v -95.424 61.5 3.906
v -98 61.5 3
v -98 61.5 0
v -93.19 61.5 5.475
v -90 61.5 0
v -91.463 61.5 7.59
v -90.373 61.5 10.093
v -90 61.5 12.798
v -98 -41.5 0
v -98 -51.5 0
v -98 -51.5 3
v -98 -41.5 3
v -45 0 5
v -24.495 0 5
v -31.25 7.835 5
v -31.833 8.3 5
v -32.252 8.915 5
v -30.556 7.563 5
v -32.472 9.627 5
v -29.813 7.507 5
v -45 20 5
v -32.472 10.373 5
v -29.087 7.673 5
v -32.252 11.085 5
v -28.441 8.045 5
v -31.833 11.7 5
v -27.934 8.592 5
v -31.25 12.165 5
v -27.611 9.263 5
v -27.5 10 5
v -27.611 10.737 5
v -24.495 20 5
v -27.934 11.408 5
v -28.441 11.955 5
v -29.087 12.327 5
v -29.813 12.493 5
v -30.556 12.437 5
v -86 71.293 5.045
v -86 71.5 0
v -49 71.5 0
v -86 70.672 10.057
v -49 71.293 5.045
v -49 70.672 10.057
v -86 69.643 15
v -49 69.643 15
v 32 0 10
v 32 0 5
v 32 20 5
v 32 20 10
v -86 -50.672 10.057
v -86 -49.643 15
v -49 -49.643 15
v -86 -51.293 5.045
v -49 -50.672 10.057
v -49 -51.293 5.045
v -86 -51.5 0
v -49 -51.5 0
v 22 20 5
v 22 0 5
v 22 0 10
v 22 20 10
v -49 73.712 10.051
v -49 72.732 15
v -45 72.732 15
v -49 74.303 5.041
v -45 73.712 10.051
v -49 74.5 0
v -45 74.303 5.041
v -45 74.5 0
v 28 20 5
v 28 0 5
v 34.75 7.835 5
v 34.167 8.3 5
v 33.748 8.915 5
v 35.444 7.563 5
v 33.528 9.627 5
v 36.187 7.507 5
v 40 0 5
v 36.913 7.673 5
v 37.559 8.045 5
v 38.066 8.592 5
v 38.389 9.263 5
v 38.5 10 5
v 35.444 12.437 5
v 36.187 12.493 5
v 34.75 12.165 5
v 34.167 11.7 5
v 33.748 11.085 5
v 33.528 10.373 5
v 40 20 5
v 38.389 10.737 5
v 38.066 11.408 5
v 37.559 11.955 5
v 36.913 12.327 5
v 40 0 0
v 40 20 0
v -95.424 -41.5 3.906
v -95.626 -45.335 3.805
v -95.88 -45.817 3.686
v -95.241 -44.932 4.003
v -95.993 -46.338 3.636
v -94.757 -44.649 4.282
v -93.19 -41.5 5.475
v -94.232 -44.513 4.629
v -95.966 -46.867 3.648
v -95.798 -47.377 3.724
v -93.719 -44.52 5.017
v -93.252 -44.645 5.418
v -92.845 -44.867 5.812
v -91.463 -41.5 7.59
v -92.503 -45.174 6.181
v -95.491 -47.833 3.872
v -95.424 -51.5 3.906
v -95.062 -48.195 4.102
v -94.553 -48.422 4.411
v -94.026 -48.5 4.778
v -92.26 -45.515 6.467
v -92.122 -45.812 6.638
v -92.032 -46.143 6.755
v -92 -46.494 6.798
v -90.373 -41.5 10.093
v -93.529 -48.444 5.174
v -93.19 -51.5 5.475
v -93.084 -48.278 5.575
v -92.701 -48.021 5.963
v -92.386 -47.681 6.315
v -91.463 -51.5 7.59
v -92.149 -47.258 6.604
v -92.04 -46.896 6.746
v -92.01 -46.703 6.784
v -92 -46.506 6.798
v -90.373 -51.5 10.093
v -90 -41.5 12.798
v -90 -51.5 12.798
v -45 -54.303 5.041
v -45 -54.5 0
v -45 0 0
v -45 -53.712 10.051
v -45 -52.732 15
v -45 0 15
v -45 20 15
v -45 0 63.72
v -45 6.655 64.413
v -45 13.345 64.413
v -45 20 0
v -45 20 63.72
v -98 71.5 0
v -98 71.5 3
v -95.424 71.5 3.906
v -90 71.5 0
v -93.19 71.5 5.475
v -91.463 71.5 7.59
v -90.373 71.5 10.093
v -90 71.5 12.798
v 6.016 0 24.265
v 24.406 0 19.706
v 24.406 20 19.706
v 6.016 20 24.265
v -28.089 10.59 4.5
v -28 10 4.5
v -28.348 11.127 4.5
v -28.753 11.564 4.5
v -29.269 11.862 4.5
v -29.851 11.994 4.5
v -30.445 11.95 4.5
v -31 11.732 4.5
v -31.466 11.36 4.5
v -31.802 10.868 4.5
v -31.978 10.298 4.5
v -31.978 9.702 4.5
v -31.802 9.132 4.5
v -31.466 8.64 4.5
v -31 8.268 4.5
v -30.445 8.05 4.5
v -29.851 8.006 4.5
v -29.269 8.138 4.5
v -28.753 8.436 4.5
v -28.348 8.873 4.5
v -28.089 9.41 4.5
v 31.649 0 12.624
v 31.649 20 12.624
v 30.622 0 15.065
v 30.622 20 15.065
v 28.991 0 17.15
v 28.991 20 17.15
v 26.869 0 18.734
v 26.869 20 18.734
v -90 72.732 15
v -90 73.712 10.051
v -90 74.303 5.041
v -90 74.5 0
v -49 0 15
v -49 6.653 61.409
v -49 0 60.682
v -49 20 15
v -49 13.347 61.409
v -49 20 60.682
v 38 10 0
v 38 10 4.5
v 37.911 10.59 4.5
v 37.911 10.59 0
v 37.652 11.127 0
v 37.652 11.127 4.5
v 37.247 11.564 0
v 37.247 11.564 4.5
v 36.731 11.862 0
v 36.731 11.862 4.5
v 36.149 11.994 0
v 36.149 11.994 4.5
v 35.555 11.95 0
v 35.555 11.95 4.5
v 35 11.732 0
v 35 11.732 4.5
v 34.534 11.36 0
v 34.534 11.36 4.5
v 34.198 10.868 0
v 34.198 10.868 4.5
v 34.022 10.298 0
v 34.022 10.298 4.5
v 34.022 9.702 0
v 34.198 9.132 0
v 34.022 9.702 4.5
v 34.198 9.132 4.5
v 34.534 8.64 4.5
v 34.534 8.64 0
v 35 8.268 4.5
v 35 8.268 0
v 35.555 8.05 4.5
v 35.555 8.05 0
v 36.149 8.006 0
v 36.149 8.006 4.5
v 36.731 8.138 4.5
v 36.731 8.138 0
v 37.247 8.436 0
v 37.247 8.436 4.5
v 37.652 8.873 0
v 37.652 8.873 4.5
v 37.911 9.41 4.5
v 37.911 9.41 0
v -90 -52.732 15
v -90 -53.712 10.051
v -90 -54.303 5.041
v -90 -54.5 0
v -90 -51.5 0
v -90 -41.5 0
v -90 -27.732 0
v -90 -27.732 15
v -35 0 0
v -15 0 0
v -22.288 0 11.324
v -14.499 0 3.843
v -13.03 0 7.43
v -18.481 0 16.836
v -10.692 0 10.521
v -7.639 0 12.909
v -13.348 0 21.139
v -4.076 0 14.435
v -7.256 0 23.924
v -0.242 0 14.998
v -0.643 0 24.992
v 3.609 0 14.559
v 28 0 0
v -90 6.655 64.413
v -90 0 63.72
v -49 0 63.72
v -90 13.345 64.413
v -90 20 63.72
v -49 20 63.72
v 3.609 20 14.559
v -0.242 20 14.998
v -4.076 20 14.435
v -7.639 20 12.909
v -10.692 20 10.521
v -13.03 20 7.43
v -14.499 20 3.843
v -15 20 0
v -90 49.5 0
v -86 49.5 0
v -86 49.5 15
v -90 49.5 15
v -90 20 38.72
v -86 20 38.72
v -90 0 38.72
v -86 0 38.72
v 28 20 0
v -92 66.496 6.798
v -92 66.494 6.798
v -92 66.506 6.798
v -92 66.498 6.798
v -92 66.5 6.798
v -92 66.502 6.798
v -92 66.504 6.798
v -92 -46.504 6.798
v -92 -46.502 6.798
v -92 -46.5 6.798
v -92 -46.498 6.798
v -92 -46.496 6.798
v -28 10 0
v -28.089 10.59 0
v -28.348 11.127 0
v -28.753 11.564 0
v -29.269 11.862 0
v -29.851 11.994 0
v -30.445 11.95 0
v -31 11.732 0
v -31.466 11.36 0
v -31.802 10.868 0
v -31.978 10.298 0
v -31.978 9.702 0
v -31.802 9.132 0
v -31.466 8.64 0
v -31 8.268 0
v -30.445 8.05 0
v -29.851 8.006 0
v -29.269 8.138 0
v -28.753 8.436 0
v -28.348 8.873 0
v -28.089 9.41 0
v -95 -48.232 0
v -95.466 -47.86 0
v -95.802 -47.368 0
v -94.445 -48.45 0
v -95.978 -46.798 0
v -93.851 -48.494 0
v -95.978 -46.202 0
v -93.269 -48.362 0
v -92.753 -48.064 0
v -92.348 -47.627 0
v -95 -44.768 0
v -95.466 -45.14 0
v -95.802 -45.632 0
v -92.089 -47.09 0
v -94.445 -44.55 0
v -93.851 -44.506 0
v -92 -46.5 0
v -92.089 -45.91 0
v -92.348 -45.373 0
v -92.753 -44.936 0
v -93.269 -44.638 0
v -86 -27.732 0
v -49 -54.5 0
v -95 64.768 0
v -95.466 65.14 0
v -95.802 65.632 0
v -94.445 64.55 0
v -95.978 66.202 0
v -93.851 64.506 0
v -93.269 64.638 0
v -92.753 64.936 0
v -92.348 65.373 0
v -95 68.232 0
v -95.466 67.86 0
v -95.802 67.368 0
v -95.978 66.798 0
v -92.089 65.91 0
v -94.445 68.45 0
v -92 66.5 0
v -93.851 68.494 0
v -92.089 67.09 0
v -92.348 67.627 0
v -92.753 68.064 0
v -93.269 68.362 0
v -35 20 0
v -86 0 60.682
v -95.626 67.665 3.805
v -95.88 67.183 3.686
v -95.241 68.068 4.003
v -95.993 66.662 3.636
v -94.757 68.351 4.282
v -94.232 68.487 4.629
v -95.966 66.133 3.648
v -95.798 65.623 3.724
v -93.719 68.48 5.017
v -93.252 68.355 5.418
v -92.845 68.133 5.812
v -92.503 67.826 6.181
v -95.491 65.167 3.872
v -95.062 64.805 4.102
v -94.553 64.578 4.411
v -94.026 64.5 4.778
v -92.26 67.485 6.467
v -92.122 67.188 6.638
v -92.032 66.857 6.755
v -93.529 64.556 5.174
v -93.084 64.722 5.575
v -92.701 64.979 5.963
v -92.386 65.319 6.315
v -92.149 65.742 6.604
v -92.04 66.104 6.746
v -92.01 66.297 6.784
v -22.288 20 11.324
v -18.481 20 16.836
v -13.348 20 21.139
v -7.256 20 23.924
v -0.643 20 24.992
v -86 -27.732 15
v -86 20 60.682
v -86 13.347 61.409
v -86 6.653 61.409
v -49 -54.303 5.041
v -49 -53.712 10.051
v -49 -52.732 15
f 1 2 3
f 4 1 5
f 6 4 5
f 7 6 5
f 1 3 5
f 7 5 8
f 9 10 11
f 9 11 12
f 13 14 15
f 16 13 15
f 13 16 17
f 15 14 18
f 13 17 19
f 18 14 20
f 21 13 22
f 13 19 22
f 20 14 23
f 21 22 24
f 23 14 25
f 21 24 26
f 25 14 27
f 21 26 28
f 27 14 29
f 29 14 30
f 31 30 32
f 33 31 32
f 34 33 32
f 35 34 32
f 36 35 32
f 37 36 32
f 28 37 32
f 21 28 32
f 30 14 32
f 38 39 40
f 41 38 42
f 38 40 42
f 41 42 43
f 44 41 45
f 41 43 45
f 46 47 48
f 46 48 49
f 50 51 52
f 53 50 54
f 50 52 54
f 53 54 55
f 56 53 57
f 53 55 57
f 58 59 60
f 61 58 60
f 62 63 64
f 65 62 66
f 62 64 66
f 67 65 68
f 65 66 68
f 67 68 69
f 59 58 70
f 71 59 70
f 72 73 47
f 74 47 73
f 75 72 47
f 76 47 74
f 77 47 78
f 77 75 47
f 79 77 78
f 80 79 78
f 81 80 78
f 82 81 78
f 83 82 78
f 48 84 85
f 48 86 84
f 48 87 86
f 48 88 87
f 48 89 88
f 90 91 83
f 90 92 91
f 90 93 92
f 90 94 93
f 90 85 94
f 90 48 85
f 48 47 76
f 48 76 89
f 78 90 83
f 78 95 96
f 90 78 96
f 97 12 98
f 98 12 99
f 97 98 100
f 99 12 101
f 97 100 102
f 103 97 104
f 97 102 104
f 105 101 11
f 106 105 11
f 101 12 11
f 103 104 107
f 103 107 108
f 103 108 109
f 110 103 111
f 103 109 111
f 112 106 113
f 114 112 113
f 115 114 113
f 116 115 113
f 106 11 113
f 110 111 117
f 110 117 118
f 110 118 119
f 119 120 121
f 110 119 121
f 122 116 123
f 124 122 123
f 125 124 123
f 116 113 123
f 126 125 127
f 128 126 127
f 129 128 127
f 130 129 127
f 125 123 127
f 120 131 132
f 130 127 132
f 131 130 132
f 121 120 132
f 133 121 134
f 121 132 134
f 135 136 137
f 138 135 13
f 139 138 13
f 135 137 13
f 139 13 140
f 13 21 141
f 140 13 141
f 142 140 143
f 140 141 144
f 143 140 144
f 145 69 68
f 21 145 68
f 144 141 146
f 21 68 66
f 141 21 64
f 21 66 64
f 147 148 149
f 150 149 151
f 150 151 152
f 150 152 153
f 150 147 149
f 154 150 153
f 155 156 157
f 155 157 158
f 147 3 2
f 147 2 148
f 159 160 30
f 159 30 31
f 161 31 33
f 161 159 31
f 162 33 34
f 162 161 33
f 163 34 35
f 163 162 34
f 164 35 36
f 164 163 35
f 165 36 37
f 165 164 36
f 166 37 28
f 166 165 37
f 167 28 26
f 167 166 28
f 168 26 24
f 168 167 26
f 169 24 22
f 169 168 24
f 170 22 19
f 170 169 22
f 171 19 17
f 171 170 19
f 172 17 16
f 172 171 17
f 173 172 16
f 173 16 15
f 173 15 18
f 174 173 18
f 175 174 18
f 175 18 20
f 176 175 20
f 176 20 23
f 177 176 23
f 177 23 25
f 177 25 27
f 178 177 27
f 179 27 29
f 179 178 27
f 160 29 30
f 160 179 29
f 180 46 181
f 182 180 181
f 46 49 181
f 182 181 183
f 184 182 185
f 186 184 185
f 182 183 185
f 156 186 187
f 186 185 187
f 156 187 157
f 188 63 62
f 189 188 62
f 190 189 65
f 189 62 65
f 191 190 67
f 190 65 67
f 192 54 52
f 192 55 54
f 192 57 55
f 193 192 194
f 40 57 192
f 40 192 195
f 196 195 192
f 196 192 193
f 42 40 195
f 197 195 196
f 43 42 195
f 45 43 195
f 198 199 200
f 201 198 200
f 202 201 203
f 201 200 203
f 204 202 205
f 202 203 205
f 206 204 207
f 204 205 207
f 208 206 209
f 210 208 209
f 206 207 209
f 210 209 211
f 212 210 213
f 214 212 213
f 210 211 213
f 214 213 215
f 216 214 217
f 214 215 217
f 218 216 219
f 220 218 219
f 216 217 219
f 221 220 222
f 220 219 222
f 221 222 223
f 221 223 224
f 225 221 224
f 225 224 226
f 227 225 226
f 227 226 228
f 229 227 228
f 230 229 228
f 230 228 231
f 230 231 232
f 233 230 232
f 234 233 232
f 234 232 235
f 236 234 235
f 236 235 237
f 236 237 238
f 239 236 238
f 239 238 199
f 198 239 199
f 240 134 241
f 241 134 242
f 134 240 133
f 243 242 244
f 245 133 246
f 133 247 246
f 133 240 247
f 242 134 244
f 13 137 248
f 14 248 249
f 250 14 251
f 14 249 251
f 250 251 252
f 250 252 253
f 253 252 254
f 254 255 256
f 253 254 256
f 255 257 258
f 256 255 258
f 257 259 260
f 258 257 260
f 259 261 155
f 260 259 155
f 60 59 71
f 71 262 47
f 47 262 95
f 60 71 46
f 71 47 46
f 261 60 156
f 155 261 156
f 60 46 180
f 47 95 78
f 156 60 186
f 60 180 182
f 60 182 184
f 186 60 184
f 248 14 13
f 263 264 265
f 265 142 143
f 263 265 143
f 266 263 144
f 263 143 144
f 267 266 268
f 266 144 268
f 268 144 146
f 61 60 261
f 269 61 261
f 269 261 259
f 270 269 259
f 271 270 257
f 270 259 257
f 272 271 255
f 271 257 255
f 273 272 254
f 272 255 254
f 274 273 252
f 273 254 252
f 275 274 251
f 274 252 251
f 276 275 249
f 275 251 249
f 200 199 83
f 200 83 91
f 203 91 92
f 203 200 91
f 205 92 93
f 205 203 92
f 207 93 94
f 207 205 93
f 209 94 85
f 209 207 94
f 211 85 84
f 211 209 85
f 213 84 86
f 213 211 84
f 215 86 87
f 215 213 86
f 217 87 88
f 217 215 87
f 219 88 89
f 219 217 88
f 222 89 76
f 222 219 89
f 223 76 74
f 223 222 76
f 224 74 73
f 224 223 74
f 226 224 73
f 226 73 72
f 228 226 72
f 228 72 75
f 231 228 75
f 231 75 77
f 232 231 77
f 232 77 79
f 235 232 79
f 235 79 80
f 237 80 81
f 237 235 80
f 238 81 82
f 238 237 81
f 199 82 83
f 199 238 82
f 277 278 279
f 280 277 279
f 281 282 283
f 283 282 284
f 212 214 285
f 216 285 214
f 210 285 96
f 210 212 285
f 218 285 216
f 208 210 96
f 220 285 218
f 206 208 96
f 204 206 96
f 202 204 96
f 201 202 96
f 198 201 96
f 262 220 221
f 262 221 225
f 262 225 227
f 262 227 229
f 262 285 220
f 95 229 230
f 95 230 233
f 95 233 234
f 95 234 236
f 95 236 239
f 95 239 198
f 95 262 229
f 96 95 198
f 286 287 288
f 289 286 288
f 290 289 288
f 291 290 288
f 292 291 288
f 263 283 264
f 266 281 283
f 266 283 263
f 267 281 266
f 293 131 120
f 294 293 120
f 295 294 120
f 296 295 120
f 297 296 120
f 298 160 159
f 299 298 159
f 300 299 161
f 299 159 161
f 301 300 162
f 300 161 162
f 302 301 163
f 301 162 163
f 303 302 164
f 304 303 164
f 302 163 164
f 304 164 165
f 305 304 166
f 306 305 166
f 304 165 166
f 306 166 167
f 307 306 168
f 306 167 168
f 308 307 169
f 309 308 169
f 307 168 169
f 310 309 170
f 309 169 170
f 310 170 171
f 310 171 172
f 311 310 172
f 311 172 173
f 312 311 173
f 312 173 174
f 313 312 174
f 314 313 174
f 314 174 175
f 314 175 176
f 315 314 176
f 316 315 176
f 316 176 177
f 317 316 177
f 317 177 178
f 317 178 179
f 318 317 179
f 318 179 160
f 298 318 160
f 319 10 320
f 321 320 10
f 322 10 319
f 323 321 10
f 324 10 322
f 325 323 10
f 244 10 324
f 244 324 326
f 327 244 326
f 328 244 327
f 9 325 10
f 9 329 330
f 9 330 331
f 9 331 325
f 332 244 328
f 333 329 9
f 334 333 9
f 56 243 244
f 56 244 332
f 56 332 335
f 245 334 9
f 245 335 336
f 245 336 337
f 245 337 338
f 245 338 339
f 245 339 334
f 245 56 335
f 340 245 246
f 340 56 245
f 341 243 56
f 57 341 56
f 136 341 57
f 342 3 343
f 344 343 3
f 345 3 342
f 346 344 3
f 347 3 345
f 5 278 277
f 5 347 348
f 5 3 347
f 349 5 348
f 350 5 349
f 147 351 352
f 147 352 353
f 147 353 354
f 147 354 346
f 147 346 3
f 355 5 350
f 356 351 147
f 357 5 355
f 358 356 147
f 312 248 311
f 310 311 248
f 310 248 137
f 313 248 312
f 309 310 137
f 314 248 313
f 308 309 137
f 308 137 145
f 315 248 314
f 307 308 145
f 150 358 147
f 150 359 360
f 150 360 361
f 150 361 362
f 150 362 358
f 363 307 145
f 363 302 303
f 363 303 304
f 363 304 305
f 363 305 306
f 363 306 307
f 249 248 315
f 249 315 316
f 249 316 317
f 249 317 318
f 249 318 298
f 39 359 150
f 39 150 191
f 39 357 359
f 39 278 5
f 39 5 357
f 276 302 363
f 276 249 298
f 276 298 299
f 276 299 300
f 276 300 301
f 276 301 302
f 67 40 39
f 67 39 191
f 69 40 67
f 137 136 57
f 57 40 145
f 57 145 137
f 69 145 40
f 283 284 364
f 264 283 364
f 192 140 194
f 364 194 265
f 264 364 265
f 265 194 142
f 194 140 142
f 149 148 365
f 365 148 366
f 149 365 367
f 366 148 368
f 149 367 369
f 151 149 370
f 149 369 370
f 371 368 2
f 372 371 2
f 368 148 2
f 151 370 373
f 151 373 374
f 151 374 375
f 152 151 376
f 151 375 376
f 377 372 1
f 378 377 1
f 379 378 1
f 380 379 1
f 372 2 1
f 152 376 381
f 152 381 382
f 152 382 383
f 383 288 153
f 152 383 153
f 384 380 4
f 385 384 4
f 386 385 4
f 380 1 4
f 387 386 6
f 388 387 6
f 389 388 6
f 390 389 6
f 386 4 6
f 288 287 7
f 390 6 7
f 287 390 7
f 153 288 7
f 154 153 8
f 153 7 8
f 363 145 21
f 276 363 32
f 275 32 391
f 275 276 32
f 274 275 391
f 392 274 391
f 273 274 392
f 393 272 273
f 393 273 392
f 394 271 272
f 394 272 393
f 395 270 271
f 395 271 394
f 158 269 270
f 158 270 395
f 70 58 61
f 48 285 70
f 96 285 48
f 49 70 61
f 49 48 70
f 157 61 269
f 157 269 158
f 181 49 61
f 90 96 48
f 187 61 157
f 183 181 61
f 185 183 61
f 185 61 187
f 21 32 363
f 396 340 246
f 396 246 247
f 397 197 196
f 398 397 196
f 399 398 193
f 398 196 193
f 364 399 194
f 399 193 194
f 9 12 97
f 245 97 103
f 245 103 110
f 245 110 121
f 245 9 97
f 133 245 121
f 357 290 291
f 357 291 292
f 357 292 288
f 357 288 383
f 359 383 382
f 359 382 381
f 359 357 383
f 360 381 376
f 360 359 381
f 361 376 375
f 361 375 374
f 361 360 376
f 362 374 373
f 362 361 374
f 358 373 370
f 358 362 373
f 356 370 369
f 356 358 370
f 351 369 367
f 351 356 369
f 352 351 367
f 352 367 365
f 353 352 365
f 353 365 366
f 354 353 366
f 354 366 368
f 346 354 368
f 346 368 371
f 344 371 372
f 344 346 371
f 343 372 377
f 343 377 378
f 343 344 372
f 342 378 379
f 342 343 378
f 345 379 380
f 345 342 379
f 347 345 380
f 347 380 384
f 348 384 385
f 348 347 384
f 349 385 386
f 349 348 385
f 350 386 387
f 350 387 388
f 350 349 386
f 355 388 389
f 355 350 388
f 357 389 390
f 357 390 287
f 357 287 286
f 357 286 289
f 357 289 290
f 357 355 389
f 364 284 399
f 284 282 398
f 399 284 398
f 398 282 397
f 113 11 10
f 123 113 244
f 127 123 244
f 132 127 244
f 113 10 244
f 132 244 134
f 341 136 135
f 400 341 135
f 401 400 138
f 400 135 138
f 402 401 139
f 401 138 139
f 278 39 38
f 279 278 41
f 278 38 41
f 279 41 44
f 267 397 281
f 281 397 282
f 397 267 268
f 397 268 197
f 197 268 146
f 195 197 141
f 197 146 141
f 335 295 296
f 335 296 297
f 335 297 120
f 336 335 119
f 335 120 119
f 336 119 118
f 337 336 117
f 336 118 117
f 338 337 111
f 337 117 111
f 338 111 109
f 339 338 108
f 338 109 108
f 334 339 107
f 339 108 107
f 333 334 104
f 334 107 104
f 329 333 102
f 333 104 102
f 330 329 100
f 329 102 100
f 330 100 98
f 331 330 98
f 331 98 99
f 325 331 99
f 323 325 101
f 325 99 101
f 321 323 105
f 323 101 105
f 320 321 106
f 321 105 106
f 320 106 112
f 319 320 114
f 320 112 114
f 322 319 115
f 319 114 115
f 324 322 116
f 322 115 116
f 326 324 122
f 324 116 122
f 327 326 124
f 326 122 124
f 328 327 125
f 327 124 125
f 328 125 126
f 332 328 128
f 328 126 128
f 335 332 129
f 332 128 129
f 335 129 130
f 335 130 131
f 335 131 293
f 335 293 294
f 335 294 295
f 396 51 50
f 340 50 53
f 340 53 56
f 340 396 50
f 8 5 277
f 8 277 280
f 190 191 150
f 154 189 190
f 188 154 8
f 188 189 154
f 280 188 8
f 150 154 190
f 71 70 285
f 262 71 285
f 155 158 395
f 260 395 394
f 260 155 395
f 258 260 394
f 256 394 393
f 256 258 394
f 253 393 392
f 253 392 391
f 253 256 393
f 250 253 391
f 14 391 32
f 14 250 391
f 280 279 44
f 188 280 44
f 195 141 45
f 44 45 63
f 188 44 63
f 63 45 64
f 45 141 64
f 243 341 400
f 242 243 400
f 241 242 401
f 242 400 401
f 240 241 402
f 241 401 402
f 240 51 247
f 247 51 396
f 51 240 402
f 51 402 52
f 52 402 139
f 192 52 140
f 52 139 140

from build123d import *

# Parameters (mm, degrees)
EXTRUDE_1_DEPTH          = 20
SKETCH_2_W               = 6
SKETCH_2_H               = 10
CUT_EXTRUDE_1_DEPTH      = 20
EXTRUDE_2_DEPTH          = 5
EXTRUDE_2_DEPTH_BACK     = 5
SKETCH_3_W               = 8
SKETCH_3_H               = 20
EXTRUDE_3_DEPTH          = 5
EXTRUDE_3_DEPTH_BACK     = 5
SKETCH_4_W               = 20
SKETCH_4_H               = 20
CUT_EXTRUDE_2_DEPTH      = 52.23475383
CUT_EXTRUDE_2_DEPTH_BACK = 52.23475383
SKETCH_5_W               = 80.386179801
SKETCH_5_H               = 26.605581219
SKETCH_6_R               = 2
CUT_EXTRUDE_3_DEPTH      = 49.989794856
CHAMFER_1_SIZE           = 0.5
FILLET_1_R               = 10
SKETCH_7_W               = 5
SKETCH_7_H               = 20
EXTRUDE_4_DEPTH          = 10
SKETCH_8_R               = 64.5
EXTRUDE_5_DEPTH          = 4
SKETCH_9_W               = 60
SKETCH_9_H               = 60
SKETCH_9_W_2             = 85.907763787
SKETCH_9_H_2             = 140
CUT_EXTRUDE_4_DEPTH      = 5
EXTRUDE_8_DEPTH          = 37
EXTRUDE_9_DEPTH          = 4
SKETCH_15_W              = 8
SKETCH_15_H              = 10
EXTRUDE_10_DEPTH         = 3
SKETCH_16_R              = 2
CUT_EXTRUDE_5_DEPTH      = 3
FILLET_START             = -51.5
FILLET_2_DEPTH           = 2.999999733
FILLET_START_2           = 61.5
FILLET_2_2_DEPTH         = 2.999999733
FILLET_START_3           = -44.499993891
FILLET_2_3_DEPTH         = 2.999993891
FILLET_START_4           = 68.500006109
FILLET_2_4_DEPTH         = 2.999993891
FILLET_START_5           = -48.500000267
FILLET_2_5_DEPTH         = 4.000006376
FILLET_START_6           = 64.499999733
FILLET_2_6_DEPTH         = 4.000006376
FILLET_START_7           = 3
FILLET_2_7_OUTLINE_R     = 2
FILLET_2_7_DEPTH         = 3.797947653


with BuildPart() as part:
    # 草图1 → 凸台-拉伸1 (new body)
    with BuildSketch(Plane(origin=(0, 0, 0), x_dir=(1, 0, 0), z_dir=(0, 1, 0))):
        with BuildLine():
            Line((32, 17.82359333), (32, -17.82359333))
            Line((32, -17.82359333), (6.015712619, -24.265432238))
            ThreePointArc((6.015712619, -24.265432238), (-25, 0), (6.015712619, 24.265432238))
            Line((6.015712619, 24.265432238), (32, 17.82359333))
        make_face()
        with BuildLine():
            Line((22, 10), (22, -10))
            Line((22, -10), (3.609427572, -14.559259343))
            ThreePointArc((3.609427572, -14.559259343), (-15, 0), (3.609427572, 14.559259343))
            Line((3.609427572, 14.559259343), (22, 10))
        make_face(mode=Mode.SUBTRACT)
    extrude(amount=EXTRUDE_1_DEPTH)

    # 草图2 → 切除-拉伸1 (cut)
    with BuildSketch(Plane(origin=(0, 20, 0), x_dir=(1, 0, 0), z_dir=(0, 1, 0))):
        with Locations((25, 0)):
            Rectangle(SKETCH_2_W, SKETCH_2_H)
    extrude(amount=-CUT_EXTRUDE_1_DEPTH, mode=Mode.SUBTRACT)

    # 草图3 → 凸台-拉伸2 (add, two sides: drawn at the far end of the back side and taken through both)
    with BuildSketch(Plane.XY.offset(-EXTRUDE_2_DEPTH_BACK)):
        with Locations((36, 10)):
            Rectangle(SKETCH_3_W, SKETCH_3_H)
    extrude(amount=EXTRUDE_2_DEPTH + EXTRUDE_2_DEPTH_BACK)

    # 草图4 → 凸台-拉伸3 (add, two sides: drawn at the far end of the back side and taken through both)
    with BuildSketch(Plane.XY.offset(-EXTRUDE_3_DEPTH_BACK)):
        with Locations((-25, 10)):
            Rectangle(SKETCH_4_W, SKETCH_4_H)
    extrude(amount=EXTRUDE_3_DEPTH + EXTRUDE_3_DEPTH_BACK)

    # 草图5 → 切除-拉伸2 (cut, two sides: drawn at the far end of the back side and taken through both)
    with BuildSketch(Plane(origin=(0, 20, 0), x_dir=(1, 0, 0), z_dir=(0, 1, 0)).offset(-CUT_EXTRUDE_2_DEPTH_BACK)):
        with Locations((-0.193089901, 13.30279061)):
            Rectangle(SKETCH_5_W, SKETCH_5_H)
    extrude(amount=CUT_EXTRUDE_2_DEPTH + CUT_EXTRUDE_2_DEPTH_BACK, mode=Mode.SUBTRACT)

    # 草图6 → 切除-拉伸3 (cut, through all)
    with BuildSketch(Plane.XY.offset(5)):
        with Locations((-30, 10)):
            Circle(SKETCH_6_R)
        with Locations((36, 10)):
            Circle(SKETCH_6_R)
    extrude(amount=-CUT_EXTRUDE_3_DEPTH, mode=Mode.SUBTRACT)

    # 倒角1
    chamfer_1_edges = [part.edges().sort_by_distance(p)[0] for p in [
        (-32, 10, 5),
        (34, 10, 5),
    ]]
    chamfer(chamfer_1_edges, length=CHAMFER_1_SIZE)

    # 圆角1
    fillet_1_edges = [part.edges().sort_by_distance(p)[0] for p in [
        (32, 10, 17.82359333),
    ]]
    fillet(fillet_1_edges, radius=FILLET_1_R)

    # 草图7 → 凸台-拉伸4 (add)
    with BuildSketch(Plane.ZY.offset(35)):
        with Locations((2.5, 10)):
            Rectangle(SKETCH_7_W, SKETCH_7_H)
    extrude(amount=EXTRUDE_4_DEPTH)

    # 草图8 → 凸台-拉伸5 (add)
    with BuildSketch(Plane.ZY.offset(45)):
        with Locations((0, 10)):
            Circle(SKETCH_8_R)
    extrude(amount=EXTRUDE_5_DEPTH)

    # 草图9 → 切除-拉伸4 (cut)
    with BuildSketch(Plane(origin=(-45, 0, 0), x_dir=(0, 0, -1), z_dir=(1, 0, 0))):
        with Locations((-45, 50)):
            Rectangle(SKETCH_9_W, SKETCH_9_H)
        with Locations((-45, -30)):
            Rectangle(SKETCH_9_W, SKETCH_9_H)
        with Locations((42.953881894, 10)):
            Rectangle(SKETCH_9_W_2, SKETCH_9_H_2)
    extrude(amount=-CUT_EXTRUDE_4_DEPTH, mode=Mode.SUBTRACT)

    # 草图11 → 凸台-拉伸8 (add)
    with BuildSketch(Plane.ZY.offset(49)):
        with BuildLine():
            ThreePointArc((60.681545794, 20), (61.5, 10), (60.681545794, 0))
            Line((60.681545794, 0), (63.720091023, 0))
            ThreePointArc((63.720091023, 0), (64.5, 10), (63.720091023, 20))
            Line((63.720091023, 20), (60.681545794, 20))
        make_face()
        with BuildLine():
            Line((0, 74.5), (0, 71.5))
            ThreePointArc((0, 71.5), (7.557274891, 71.0339053), (15, 69.642686056))
            Line((15, 69.642686056), (15, 72.731570999))
            ThreePointArc((15, 72.731570999), (7.551942484, 74.05636709), (0, 74.5))
        make_face()
        with BuildLine():
            ThreePointArc((15, -49.642686056), (7.557274891, -51.0339053), (0, -51.5))
            Line((0, -51.5), (0, -54.5))
            ThreePointArc((0, -54.5), (7.551942484, -54.05636709), (15, -52.731570999))
            Line((15, -52.731570999), (15, -49.642686056))
        make_face()
    extrude(amount=EXTRUDE_8_DEPTH)

    # 草图13 → 凸台-拉伸9 (add)
    with BuildSketch(Plane.ZY.offset(86)):
        with BuildLine():
            Line((63.720091023, 20), (38.720091023, 20))
            Line((38.720091023, 20), (38.720091023, 0))
            Line((38.720091023, 0), (63.720091023, 0))
            ThreePointArc((63.720091023, 0), (64.5, 10), (63.720091023, 20))
        make_face()
        with BuildLine():
            Line((0, -54.5), (0, -27.731570999))
            Line((0, -27.731570999), (15, -27.731570999))
            Line((15, -27.731570999), (15, -52.731570999))
            ThreePointArc((15, -52.731570999), (7.551942484, -54.05636709), (0, -54.5))
        make_face()
        with BuildLine():
            Line((0, 74.5), (0, 49.5))
            Line((0, 49.5), (15, 49.5))
            Line((15, 49.5), (15, 72.731570999))
            ThreePointArc((15, 72.731570999), (7.551942484, 74.05636709), (0, 74.5))
        make_face()
    extrude(amount=EXTRUDE_9_DEPTH)

    # 草图15 → 凸台-拉伸10 (add)
    with BuildSketch(Plane(origin=(0, 0, 0), x_dir=(-1, 0, 0), z_dir=(0, 0, -1))):
        with Locations((94, 66.5)):
            Rectangle(SKETCH_15_W, SKETCH_15_H)
        with Locations((94, -46.5)):
            Rectangle(SKETCH_15_W, SKETCH_15_H)
    extrude(amount=-EXTRUDE_10_DEPTH)

    # 草图16 → 切除-拉伸5 (cut)
    with BuildSketch(Plane.XY.offset(3)):
        with Locations((-94, 66.5)):
            Circle(SKETCH_16_R)
        with Locations((-94, -46.5)):
            Circle(SKETCH_16_R)
    extrude(amount=-CUT_EXTRUDE_5_DEPTH, mode=Mode.SUBTRACT)

    # 圆角2: read off the stored shape, not the designer's step
    # 圆角2 outline → 圆角2 (add)
    with BuildSketch(Plane(origin=(0, 0, 0), x_dir=(1, 0, 0), z_dir=(0, 1, 0)).offset(FILLET_START)):
        with BuildLine():
            ThreePointArc((-98, -3), (-92.254033308, -6.473403651), (-90, -12.797958971))
            Line((-90, -12.797958971), (-90, -3))
            Line((-90, -3), (-98, -3))
        make_face()
    extrude(amount=FILLET_2_DEPTH)

    # Fillet 2 2 outline → Fillet 2 2 (add)
    with BuildSketch(Plane(origin=(0, 0, 0), x_dir=(1, 0, 0), z_dir=(0, 1, 0)).offset(FILLET_START_2)):
        with BuildLine():
            ThreePointArc((-98, -3), (-92.254033308, -6.473403651), (-90, -12.797958971))
            Line((-90, -12.797958971), (-90, -3))
            Line((-90, -3), (-98, -3))
        make_face()
    extrude(amount=FILLET_2_2_DEPTH)

    # Fillet 2 3 outline → Fillet 2 3 (add)
    with BuildSketch(Plane(origin=(0, 0, 0), x_dir=(1, 0, 0), z_dir=(0, 1, 0)).offset(FILLET_START_3)):
        with BuildLine():
            ThreePointArc((-98, -3), (-92.254033308, -6.473403651), (-90, -12.797958971))
            Line((-90, -12.797958971), (-90, -3))
            Line((-90, -3), (-98, -3))
        make_face()
    extrude(amount=FILLET_2_3_DEPTH)

    # Fillet 2 4 outline → Fillet 2 4 (add)
    with BuildSketch(Plane(origin=(0, 0, 0), x_dir=(1, 0, 0), z_dir=(0, 1, 0)).offset(FILLET_START_4)):
        with BuildLine():
            ThreePointArc((-98, -3), (-92.254033308, -6.473403651), (-90, -12.797958971))
            Line((-90, -12.797958971), (-90, -3))
            Line((-90, -3), (-98, -3))
        make_face()
    extrude(amount=FILLET_2_4_DEPTH)

    # Fillet 2 5 outline → Fillet 2 5 (add)
    with BuildSketch(Plane(origin=(0, 0, 0), x_dir=(1, 0, 0), z_dir=(0, 1, 0)).offset(FILLET_START_5)):
        with BuildLine():
            ThreePointArc((-98, -3), (-92.254033308, -6.473403651), (-90, -12.797958971))
            Line((-90, -12.797958971), (-90, -3))
            Line((-90, -3), (-98, -3))
        make_face()
    extrude(amount=FILLET_2_5_DEPTH)

    # Fillet 2 6 outline → Fillet 2 6 (add)
    with BuildSketch(Plane(origin=(0, 0, 0), x_dir=(1, 0, 0), z_dir=(0, 1, 0)).offset(FILLET_START_6)):
        with BuildLine():
            ThreePointArc((-98, -3), (-92.254033308, -6.473403651), (-90, -12.797958971))
            Line((-90, -12.797958971), (-90, -3))
            Line((-90, -3), (-98, -3))
        make_face()
    extrude(amount=FILLET_2_6_DEPTH)

    # Fillet 2 7 outline → Fillet 2 7 (cut)
    with BuildSketch(Plane.XY.offset(FILLET_START_7)):
        with Locations((-94, 66.5)):
            Circle(FILLET_2_7_OUTLINE_R)
        with Locations((-94, -46.5)):
            Circle(FILLET_2_7_OUTLINE_R)
    extrude(amount=FILLET_2_7_DEPTH, mode=Mode.SUBTRACT)


solid = part.part
